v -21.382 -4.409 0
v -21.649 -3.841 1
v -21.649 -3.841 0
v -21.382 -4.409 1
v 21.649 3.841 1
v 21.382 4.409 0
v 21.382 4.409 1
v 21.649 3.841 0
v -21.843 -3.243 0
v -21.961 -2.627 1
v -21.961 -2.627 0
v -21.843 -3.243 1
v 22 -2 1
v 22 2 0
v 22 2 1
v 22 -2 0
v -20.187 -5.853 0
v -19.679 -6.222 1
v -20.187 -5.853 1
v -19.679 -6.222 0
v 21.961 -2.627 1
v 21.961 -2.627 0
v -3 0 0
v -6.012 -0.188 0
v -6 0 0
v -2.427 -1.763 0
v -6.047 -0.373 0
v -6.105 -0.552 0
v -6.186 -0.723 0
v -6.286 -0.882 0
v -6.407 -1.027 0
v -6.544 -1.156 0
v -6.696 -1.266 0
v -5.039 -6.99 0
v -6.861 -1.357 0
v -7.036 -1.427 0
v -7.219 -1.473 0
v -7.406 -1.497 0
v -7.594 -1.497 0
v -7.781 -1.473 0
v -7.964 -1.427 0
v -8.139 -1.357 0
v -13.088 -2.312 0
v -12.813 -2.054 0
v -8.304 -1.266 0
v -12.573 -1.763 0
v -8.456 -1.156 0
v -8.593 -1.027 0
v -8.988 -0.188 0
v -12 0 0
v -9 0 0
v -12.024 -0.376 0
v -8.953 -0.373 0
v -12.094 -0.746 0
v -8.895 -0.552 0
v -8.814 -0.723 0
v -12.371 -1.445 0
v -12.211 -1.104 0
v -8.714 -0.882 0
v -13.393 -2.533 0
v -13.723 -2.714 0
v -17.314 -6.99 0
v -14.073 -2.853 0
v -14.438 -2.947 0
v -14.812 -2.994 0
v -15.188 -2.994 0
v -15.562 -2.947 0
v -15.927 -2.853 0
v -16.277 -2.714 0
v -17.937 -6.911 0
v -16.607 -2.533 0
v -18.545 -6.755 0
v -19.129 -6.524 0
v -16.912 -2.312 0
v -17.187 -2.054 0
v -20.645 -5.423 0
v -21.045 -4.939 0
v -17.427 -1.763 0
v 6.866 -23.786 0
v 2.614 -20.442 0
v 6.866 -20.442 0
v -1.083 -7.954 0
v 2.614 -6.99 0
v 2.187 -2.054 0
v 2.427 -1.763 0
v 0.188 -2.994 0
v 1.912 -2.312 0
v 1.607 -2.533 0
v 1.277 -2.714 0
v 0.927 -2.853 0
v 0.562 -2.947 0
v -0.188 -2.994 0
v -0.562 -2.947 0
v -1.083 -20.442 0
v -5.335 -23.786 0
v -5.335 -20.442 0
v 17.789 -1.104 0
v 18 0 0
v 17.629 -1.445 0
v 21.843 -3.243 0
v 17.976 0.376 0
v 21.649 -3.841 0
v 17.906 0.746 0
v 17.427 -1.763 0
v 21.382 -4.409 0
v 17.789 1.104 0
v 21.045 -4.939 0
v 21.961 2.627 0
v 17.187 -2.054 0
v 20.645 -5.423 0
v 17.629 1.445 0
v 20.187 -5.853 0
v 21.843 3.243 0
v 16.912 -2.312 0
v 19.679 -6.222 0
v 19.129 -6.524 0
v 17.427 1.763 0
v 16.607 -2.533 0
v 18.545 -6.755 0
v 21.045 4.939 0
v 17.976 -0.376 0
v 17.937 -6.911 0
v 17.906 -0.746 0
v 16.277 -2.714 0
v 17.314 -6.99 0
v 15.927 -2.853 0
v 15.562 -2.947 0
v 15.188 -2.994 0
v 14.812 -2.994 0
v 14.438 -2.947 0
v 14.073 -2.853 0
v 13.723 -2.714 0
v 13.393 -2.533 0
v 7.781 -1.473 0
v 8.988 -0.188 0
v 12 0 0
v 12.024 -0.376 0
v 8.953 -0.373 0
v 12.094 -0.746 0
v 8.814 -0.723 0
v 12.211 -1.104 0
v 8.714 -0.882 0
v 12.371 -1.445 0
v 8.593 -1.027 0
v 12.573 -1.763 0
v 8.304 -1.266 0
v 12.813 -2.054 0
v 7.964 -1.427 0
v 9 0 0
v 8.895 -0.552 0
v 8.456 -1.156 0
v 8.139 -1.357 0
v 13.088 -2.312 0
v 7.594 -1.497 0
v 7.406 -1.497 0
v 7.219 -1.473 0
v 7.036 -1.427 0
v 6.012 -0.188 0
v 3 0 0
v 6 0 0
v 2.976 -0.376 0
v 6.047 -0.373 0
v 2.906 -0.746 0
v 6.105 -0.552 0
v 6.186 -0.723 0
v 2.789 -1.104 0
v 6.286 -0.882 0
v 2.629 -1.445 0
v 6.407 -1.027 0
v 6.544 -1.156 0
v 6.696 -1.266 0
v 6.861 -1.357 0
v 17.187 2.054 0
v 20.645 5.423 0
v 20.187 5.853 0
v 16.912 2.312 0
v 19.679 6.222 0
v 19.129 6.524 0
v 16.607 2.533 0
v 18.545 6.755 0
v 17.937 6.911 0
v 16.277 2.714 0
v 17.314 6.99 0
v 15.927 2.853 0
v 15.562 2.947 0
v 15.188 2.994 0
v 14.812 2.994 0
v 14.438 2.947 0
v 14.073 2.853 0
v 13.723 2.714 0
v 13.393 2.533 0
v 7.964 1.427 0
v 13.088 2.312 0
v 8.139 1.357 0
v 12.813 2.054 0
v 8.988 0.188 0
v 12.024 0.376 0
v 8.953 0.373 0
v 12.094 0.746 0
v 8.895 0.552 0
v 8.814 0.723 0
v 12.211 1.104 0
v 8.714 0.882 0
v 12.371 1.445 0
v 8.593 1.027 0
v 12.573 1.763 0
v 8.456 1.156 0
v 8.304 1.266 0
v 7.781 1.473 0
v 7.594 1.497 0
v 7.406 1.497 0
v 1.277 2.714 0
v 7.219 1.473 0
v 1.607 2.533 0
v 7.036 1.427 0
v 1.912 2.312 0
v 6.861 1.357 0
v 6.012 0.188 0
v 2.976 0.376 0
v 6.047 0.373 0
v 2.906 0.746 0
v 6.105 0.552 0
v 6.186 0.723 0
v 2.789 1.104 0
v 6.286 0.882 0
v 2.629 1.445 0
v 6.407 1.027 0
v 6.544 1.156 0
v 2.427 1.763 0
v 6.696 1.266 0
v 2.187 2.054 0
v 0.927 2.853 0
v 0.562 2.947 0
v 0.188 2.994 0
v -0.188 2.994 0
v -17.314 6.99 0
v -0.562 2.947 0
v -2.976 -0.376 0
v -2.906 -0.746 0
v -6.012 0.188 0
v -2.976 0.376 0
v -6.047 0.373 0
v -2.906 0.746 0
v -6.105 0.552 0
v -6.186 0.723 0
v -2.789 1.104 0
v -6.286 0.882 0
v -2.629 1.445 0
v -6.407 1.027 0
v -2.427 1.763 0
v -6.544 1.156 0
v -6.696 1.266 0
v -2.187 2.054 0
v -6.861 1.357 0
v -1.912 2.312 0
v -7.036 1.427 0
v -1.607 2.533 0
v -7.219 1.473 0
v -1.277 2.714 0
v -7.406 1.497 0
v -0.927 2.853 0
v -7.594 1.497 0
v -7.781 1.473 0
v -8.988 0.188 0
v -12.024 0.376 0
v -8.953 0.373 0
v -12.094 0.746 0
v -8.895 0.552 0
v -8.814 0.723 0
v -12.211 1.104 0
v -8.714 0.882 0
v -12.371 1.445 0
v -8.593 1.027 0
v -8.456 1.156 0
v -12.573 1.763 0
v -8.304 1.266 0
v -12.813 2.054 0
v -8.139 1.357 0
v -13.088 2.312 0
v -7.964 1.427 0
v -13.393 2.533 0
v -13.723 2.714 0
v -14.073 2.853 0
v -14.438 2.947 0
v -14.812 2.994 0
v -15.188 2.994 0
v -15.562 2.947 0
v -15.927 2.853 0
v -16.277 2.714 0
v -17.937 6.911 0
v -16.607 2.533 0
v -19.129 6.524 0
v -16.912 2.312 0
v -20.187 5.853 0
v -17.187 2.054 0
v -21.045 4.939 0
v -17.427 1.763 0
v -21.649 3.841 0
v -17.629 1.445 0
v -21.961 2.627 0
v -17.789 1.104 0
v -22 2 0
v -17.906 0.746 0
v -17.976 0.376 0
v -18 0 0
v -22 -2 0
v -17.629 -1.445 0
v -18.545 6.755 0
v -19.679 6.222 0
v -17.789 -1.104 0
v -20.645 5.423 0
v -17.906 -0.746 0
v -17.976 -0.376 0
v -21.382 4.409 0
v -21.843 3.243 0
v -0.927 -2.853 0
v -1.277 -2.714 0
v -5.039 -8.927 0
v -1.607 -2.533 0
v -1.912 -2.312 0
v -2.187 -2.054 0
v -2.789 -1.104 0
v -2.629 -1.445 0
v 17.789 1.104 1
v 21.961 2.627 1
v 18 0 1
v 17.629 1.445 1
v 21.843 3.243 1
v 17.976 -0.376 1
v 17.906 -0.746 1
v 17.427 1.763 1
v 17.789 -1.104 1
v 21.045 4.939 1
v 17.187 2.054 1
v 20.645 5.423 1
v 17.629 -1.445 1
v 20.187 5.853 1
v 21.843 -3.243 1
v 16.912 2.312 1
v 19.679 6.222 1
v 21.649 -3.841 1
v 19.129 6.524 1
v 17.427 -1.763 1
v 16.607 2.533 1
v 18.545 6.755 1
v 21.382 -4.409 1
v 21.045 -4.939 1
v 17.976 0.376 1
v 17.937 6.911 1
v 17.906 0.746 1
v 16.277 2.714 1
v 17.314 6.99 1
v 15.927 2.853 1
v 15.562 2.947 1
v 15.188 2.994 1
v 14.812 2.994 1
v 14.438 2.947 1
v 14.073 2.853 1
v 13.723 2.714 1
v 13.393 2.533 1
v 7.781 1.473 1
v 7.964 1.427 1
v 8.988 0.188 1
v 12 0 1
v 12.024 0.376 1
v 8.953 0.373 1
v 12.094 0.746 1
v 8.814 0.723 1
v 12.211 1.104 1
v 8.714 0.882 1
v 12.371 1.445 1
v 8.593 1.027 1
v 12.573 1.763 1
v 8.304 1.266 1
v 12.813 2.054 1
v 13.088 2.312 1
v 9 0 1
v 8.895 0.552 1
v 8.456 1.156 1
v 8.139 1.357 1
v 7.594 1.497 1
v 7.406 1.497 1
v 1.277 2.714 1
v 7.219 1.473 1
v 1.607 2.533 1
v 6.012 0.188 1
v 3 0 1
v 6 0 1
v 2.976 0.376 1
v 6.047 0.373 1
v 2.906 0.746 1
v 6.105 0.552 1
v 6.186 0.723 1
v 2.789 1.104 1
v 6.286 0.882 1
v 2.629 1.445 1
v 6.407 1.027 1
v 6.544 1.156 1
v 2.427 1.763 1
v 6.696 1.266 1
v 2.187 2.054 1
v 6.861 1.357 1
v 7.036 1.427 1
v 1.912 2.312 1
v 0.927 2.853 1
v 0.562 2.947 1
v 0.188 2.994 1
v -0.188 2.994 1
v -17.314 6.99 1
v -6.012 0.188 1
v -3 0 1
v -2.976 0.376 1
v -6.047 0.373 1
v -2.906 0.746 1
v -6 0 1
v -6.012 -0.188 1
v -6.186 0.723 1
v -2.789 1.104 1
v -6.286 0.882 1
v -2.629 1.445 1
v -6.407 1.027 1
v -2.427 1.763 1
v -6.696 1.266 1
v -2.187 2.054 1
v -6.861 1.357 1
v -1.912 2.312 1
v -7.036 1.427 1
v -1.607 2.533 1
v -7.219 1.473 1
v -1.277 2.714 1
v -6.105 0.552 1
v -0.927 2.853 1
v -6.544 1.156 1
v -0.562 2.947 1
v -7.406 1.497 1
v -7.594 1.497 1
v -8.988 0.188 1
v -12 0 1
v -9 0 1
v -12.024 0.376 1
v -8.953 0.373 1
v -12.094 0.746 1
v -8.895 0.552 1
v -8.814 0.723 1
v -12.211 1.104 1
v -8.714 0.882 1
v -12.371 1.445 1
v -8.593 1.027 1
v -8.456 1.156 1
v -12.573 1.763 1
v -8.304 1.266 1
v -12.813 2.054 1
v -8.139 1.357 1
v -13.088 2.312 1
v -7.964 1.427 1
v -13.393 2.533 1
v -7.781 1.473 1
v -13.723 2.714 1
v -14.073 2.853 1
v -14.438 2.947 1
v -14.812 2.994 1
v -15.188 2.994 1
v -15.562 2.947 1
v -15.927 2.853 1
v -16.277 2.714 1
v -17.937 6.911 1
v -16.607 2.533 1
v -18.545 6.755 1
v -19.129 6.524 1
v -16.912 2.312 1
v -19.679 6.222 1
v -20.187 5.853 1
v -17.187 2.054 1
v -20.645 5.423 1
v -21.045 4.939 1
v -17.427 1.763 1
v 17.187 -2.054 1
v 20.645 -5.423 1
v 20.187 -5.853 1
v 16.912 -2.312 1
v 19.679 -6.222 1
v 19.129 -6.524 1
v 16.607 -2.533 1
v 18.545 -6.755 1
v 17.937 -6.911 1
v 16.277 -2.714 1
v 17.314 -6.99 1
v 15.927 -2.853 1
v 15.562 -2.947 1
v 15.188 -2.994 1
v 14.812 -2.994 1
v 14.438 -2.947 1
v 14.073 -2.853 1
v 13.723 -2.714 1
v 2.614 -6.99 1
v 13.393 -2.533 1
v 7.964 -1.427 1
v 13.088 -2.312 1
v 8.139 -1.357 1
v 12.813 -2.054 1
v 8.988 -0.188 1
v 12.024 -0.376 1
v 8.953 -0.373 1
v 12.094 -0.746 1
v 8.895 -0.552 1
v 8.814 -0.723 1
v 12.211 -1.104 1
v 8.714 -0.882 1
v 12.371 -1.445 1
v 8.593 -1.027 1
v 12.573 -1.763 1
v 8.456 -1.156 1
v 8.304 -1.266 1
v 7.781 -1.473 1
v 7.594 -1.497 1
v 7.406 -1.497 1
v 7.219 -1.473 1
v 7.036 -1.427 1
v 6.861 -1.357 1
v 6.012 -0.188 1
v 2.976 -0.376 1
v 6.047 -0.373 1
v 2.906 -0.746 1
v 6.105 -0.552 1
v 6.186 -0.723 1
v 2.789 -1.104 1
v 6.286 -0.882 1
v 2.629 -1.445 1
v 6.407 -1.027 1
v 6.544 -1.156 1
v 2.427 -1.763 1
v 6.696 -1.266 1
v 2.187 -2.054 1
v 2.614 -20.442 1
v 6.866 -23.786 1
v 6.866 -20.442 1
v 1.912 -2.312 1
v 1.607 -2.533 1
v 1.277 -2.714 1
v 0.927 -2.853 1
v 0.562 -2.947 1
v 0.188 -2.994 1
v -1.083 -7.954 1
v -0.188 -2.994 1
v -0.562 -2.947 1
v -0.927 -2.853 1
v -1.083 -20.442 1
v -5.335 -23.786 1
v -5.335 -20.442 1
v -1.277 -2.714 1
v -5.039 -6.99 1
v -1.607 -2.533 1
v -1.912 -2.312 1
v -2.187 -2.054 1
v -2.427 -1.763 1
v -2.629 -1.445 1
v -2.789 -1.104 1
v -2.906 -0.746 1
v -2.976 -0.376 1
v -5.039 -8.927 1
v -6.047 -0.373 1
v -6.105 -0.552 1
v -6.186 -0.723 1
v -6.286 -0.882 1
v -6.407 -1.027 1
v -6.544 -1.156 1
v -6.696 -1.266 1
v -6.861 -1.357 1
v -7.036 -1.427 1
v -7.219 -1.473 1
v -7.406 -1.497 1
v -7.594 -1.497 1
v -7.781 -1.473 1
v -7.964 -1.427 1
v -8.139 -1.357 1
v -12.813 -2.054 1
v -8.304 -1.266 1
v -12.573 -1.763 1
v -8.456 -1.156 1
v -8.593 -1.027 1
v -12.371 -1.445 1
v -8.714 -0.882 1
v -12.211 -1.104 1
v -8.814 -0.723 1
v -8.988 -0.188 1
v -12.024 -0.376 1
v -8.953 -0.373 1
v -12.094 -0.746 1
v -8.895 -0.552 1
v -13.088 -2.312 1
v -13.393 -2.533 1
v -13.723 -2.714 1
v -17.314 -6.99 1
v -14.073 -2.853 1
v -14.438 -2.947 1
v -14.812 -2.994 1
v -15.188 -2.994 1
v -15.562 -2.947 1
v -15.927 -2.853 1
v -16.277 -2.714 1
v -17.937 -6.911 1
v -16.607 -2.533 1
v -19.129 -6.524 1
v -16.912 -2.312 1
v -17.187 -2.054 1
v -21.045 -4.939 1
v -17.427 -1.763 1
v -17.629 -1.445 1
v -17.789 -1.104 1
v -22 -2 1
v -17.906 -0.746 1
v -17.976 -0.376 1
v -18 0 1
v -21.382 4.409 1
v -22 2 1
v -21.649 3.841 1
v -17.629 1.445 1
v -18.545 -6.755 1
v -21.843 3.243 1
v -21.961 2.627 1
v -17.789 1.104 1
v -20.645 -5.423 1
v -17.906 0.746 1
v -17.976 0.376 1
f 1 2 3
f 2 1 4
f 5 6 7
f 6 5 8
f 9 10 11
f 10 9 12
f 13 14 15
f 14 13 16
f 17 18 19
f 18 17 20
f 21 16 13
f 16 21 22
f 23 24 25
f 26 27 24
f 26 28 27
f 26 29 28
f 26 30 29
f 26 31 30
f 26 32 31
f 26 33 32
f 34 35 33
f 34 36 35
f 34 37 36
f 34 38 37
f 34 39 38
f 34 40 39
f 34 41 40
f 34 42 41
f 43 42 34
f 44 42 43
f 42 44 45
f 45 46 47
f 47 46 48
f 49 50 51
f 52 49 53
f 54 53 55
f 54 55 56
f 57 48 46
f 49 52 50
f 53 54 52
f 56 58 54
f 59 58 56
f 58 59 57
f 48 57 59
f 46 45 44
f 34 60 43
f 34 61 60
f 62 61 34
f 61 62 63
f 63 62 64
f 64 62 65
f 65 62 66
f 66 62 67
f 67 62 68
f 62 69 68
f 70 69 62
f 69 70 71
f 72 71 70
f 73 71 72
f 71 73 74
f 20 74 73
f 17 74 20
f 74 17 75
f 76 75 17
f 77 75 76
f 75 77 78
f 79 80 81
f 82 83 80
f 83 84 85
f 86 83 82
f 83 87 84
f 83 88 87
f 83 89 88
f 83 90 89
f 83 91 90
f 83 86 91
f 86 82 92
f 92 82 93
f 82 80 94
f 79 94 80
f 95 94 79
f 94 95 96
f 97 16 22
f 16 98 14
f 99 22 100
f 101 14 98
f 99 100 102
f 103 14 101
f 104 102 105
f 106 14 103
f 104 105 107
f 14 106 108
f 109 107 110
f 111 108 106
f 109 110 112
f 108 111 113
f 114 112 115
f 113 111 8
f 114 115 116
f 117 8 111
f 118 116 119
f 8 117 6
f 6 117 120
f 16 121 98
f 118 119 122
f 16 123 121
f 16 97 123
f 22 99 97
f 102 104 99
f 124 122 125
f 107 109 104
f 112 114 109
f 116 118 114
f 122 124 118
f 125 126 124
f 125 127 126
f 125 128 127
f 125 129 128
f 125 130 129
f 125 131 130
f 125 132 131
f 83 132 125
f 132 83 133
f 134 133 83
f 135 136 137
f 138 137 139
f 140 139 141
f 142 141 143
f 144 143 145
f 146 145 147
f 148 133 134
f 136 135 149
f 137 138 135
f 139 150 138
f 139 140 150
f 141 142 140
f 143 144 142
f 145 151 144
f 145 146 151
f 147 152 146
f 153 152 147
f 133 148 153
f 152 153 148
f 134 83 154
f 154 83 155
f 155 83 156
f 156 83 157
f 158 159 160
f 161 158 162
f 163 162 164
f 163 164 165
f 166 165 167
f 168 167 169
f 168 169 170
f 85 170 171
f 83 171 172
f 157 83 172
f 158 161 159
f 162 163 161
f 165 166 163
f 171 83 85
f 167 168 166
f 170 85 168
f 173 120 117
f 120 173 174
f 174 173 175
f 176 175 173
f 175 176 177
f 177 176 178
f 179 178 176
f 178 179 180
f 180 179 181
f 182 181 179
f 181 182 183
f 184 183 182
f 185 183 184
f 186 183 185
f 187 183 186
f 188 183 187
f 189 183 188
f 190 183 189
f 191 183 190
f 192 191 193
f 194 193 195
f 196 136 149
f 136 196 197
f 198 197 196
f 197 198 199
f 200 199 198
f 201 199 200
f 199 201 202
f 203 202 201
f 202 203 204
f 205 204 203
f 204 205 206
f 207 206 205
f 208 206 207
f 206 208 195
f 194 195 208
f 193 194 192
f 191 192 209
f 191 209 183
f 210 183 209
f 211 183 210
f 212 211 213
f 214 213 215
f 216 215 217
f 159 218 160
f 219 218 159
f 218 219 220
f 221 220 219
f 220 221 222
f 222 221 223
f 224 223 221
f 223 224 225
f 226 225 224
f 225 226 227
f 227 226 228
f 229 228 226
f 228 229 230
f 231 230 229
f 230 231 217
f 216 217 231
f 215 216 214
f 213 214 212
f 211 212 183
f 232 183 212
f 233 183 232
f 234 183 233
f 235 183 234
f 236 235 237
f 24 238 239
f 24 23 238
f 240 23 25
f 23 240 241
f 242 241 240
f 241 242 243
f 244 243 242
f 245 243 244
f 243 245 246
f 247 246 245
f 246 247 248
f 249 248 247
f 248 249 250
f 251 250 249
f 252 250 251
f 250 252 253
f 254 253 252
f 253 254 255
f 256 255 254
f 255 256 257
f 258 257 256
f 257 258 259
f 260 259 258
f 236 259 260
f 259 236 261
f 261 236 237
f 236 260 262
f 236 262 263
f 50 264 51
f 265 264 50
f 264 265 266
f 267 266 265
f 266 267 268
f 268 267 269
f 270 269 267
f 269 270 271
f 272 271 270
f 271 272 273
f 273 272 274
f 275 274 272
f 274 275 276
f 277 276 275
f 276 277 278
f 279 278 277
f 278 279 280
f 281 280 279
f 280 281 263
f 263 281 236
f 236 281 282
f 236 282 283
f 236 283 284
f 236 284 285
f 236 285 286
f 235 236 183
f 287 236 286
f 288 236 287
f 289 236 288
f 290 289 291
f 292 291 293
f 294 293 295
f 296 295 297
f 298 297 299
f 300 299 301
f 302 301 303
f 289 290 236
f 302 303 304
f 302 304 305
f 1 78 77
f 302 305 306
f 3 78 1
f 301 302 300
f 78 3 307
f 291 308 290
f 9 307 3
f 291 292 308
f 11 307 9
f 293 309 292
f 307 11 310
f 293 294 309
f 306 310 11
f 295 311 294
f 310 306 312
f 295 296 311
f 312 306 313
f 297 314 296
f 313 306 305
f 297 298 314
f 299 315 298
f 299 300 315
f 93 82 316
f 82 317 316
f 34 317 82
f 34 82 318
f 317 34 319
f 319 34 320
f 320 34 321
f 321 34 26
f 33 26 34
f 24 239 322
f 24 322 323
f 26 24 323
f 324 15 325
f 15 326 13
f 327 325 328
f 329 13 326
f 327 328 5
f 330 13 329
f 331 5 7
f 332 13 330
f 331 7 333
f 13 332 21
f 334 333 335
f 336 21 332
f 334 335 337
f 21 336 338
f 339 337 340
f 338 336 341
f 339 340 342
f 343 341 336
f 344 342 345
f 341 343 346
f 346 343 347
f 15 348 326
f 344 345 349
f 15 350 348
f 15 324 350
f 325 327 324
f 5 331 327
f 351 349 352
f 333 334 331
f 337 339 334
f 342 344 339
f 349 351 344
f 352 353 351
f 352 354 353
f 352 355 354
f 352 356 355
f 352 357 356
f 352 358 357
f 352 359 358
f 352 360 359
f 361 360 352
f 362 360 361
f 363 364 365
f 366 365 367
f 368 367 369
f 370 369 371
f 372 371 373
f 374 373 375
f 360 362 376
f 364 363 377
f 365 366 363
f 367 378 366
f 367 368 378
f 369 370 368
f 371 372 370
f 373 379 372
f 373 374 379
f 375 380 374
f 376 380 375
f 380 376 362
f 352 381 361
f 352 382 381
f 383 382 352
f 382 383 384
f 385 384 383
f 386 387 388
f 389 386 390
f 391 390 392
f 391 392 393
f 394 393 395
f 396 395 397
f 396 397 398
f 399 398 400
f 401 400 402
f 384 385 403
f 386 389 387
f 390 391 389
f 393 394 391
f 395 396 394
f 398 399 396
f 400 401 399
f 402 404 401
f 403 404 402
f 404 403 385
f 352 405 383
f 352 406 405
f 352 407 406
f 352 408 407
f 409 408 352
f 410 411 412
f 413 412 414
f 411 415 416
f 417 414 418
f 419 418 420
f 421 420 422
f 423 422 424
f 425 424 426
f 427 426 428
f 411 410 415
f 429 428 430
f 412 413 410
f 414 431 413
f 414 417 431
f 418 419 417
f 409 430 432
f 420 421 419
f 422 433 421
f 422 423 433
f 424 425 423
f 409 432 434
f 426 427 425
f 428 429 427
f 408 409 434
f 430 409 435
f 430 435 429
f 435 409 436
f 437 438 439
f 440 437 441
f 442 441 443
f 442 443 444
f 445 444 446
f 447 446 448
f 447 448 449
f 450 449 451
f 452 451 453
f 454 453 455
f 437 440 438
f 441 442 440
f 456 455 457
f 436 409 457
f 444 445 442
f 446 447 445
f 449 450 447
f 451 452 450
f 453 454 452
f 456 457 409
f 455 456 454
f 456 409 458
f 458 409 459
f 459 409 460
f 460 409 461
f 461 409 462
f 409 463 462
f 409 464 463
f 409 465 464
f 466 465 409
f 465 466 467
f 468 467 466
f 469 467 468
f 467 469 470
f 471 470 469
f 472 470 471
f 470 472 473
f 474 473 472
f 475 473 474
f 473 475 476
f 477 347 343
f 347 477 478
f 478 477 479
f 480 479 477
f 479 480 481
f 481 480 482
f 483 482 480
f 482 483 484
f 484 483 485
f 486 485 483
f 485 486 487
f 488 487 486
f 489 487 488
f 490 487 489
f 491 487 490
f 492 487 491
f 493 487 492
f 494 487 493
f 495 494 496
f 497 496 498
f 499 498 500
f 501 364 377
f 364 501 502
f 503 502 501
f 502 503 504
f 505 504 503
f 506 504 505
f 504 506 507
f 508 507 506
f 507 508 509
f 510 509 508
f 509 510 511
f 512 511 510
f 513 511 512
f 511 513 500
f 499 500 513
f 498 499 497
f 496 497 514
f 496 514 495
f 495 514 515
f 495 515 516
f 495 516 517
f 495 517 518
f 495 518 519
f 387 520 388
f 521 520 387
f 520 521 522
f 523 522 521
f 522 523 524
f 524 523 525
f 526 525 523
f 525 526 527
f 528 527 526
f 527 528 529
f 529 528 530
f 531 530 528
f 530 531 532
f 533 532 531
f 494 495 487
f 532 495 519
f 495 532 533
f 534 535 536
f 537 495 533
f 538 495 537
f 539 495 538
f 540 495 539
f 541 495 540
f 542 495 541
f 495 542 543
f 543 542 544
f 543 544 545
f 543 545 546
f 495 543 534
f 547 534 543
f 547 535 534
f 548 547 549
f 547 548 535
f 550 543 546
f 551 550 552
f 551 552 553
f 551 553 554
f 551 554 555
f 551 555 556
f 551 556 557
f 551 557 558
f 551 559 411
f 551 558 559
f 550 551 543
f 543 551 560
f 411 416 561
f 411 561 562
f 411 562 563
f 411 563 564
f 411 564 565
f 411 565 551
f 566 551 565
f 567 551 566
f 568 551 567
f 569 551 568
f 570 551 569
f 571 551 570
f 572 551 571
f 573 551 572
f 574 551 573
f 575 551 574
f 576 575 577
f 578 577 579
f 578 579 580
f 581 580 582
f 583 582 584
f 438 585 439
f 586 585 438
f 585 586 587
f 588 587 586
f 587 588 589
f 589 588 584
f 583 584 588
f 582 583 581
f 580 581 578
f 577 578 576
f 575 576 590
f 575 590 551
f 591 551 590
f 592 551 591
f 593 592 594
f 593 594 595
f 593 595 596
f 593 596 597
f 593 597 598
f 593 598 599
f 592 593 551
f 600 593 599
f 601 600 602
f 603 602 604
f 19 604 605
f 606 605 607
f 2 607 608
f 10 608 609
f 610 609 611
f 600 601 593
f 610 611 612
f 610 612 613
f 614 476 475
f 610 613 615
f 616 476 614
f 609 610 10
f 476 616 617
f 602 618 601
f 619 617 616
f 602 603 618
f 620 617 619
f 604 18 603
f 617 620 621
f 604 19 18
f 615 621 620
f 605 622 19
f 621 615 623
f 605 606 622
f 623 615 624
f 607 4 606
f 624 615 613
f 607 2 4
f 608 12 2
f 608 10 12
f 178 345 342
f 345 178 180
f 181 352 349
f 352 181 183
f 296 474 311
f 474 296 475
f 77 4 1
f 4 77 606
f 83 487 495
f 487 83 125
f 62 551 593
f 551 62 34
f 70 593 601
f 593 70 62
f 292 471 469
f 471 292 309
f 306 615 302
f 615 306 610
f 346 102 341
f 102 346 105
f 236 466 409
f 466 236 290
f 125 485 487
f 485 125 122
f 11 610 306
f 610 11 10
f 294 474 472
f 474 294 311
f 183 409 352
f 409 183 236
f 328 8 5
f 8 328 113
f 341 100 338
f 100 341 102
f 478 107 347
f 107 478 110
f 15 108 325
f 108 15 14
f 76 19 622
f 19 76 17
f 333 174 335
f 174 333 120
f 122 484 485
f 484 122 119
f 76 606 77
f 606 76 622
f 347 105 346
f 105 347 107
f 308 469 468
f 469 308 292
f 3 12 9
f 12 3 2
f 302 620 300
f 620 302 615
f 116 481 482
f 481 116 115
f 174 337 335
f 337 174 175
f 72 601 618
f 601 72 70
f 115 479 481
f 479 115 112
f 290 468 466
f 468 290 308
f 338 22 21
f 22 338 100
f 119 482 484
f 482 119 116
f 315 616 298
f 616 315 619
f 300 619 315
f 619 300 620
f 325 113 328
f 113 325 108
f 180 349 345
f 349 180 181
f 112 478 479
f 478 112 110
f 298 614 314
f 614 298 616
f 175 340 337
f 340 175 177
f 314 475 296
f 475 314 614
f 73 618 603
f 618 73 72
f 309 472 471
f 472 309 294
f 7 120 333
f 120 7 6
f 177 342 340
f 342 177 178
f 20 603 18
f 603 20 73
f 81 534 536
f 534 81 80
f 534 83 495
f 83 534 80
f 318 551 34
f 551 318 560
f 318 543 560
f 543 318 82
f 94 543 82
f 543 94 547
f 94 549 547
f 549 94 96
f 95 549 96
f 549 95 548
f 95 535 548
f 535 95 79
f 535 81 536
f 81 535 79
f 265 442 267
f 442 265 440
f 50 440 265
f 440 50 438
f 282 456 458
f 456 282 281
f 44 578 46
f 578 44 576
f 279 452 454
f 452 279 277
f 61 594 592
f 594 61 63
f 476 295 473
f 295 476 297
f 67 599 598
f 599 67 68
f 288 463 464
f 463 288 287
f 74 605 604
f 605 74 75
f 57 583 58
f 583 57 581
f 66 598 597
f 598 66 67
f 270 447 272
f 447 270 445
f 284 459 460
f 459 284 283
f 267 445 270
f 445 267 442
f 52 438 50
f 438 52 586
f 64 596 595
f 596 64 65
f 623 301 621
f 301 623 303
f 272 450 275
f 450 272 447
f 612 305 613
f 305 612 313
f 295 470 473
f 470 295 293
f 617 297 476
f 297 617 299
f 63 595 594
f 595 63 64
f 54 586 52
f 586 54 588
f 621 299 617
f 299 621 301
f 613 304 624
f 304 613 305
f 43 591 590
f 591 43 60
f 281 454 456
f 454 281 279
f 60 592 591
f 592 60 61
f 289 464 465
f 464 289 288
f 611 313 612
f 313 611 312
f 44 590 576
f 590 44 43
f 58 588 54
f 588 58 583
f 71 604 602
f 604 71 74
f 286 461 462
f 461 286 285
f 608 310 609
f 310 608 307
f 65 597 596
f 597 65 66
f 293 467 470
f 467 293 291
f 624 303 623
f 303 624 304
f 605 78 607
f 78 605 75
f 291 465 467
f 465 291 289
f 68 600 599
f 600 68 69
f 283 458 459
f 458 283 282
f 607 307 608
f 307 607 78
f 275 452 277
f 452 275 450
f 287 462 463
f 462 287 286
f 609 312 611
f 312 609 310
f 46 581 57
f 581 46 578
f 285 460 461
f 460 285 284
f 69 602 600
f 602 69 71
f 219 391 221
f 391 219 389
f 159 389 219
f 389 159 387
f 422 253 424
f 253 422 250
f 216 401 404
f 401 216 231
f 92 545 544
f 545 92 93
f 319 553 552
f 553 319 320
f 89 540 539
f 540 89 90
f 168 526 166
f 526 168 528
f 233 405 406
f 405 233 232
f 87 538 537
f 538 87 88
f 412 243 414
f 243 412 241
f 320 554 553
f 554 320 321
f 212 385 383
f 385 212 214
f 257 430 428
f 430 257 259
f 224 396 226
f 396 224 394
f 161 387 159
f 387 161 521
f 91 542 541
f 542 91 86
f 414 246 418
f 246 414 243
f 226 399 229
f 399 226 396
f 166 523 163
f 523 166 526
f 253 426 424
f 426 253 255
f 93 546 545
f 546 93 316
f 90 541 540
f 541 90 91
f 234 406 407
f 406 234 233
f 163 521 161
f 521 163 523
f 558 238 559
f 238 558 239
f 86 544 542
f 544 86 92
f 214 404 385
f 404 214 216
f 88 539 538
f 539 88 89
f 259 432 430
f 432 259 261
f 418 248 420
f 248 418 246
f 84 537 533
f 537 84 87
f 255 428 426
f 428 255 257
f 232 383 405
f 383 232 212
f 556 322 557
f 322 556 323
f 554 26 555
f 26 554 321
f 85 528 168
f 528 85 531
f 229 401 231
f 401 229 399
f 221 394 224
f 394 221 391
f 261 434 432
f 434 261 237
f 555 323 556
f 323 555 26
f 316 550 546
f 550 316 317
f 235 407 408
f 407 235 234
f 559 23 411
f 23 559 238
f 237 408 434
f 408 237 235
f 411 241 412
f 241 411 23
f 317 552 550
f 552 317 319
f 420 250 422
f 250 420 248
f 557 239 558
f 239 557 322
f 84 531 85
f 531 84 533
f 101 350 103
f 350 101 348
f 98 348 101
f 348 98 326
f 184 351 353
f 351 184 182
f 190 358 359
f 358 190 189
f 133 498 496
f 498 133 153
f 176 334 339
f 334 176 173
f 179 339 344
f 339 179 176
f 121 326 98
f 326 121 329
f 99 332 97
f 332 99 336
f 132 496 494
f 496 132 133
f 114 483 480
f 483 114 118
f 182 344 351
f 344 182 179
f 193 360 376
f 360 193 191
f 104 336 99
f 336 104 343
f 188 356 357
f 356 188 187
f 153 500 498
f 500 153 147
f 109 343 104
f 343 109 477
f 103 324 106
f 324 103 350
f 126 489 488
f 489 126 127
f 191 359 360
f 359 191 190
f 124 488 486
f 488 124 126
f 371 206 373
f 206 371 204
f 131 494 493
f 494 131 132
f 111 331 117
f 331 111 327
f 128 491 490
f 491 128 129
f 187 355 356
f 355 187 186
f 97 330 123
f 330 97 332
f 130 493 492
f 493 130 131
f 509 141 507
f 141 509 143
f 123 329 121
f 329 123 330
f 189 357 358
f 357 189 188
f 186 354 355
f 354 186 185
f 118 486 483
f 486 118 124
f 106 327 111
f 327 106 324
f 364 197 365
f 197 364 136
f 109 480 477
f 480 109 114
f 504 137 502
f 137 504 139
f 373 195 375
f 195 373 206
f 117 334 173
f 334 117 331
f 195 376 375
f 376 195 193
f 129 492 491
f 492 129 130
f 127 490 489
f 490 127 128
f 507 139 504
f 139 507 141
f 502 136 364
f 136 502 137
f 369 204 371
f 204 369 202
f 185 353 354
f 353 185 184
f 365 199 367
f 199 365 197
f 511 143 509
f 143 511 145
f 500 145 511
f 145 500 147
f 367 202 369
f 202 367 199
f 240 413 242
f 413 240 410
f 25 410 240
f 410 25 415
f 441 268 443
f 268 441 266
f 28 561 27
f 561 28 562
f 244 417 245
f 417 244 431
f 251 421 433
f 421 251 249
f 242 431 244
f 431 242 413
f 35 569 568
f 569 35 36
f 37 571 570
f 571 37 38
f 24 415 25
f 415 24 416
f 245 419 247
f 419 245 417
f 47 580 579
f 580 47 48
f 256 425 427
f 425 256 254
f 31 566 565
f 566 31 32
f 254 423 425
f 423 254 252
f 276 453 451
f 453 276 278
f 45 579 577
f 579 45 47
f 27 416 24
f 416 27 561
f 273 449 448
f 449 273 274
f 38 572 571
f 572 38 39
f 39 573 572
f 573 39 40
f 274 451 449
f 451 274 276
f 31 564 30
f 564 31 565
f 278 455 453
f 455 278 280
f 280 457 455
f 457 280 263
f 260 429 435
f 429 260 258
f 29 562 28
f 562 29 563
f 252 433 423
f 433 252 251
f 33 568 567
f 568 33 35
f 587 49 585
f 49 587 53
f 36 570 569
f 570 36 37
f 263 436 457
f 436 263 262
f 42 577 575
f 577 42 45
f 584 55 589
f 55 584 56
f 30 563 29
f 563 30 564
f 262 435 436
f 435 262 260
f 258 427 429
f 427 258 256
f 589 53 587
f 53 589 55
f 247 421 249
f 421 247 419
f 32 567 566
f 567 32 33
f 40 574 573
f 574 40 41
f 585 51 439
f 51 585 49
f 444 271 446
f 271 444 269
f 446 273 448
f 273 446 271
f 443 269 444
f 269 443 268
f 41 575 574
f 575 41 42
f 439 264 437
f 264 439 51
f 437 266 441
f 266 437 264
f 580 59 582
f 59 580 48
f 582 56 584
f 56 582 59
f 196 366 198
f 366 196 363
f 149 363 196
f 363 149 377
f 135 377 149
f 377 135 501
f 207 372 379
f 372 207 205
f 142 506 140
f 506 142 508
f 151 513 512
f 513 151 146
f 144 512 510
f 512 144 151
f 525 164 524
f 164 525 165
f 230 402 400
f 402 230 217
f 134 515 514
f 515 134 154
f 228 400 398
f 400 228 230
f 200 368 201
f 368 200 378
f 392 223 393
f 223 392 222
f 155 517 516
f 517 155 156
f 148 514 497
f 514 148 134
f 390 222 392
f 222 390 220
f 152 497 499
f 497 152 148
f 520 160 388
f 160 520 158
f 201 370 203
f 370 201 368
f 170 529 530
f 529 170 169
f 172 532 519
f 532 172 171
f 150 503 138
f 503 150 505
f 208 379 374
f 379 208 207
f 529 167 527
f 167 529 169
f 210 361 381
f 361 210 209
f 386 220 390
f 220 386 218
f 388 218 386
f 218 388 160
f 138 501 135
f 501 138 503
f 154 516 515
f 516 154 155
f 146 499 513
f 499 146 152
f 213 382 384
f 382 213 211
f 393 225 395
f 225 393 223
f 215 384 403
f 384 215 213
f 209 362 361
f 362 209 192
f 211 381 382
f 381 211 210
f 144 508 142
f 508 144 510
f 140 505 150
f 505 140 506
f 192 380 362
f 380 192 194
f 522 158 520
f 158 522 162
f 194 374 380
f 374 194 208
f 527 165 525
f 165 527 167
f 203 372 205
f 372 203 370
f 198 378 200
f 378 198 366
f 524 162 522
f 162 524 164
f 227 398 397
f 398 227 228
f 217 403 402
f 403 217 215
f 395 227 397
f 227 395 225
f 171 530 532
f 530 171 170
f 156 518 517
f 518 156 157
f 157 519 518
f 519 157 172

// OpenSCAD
$fn = 50;


difference() {
	union() {
		hull() {
			translate(v = [-17.0000000000, 2.0000000000, 0]) {
				cylinder(h = 1, r = 5);
			}
			translate(v = [17.0000000000, 2.0000000000, 0]) {
				cylinder(h = 1, r = 5);
			}
			translate(v = [-17.0000000000, -2.0000000000, 0]) {
				cylinder(h = 1, r = 5);
			}
			translate(v = [17.0000000000, -2.0000000000, 0]) {
				cylinder(h = 1, r = 5);
			}
		}
		translate(v = [0, -5, 0]) {
			linear_extrude(height = 1) {
				text(font = "DejaVu Sans Mono:style=Bold", halign = "center", size = 19.0000000000, text = "1", valign = "top");
			}
		}
	}
	union() {
		translate(v = [-15.0000000000, 0.0000000000, 0]) {
			translate(v = [0, 0, -100]) {
				cylinder(h = 200, r = 3.0000000000);
			}
		}
		translate(v = [0, 0, -100]) {
			cylinder(h = 200, r = 3.0000000000);
		}
		translate(v = [15.0000000000, 0.0000000000, 0]) {
			translate(v = [0, 0, -100]) {
				cylinder(h = 200, r = 3.0000000000);
			}
		}
		translate(v = [-15.0000000000, 0.0000000000, 0]) {
			translate(v = [0, 0, -100]) {
				cylinder(h = 200, r = 1.5000000000);
			}
		}
		translate(v = [-7.5000000000, 0.0000000000, 0]) {
			translate(v = [0, 0, -100]) {
				cylinder(h = 200, r = 1.5000000000);
			}
		}
		translate(v = [0, 0, -100]) {
			cylinder(h = 200, r = 1.5000000000);
		}
		translate(v = [7.5000000000, 0.0000000000, 0]) {
			translate(v = [0, 0, -100]) {
				cylinder(h = 200, r = 1.5000000000);
			}
		}
		translate(v = [15.0000000000, 0.0000000000, 0]) {
			translate(v = [0, 0, -100]) {
				cylinder(h = 200, r = 1.5000000000);
			}
		}
	}
}
